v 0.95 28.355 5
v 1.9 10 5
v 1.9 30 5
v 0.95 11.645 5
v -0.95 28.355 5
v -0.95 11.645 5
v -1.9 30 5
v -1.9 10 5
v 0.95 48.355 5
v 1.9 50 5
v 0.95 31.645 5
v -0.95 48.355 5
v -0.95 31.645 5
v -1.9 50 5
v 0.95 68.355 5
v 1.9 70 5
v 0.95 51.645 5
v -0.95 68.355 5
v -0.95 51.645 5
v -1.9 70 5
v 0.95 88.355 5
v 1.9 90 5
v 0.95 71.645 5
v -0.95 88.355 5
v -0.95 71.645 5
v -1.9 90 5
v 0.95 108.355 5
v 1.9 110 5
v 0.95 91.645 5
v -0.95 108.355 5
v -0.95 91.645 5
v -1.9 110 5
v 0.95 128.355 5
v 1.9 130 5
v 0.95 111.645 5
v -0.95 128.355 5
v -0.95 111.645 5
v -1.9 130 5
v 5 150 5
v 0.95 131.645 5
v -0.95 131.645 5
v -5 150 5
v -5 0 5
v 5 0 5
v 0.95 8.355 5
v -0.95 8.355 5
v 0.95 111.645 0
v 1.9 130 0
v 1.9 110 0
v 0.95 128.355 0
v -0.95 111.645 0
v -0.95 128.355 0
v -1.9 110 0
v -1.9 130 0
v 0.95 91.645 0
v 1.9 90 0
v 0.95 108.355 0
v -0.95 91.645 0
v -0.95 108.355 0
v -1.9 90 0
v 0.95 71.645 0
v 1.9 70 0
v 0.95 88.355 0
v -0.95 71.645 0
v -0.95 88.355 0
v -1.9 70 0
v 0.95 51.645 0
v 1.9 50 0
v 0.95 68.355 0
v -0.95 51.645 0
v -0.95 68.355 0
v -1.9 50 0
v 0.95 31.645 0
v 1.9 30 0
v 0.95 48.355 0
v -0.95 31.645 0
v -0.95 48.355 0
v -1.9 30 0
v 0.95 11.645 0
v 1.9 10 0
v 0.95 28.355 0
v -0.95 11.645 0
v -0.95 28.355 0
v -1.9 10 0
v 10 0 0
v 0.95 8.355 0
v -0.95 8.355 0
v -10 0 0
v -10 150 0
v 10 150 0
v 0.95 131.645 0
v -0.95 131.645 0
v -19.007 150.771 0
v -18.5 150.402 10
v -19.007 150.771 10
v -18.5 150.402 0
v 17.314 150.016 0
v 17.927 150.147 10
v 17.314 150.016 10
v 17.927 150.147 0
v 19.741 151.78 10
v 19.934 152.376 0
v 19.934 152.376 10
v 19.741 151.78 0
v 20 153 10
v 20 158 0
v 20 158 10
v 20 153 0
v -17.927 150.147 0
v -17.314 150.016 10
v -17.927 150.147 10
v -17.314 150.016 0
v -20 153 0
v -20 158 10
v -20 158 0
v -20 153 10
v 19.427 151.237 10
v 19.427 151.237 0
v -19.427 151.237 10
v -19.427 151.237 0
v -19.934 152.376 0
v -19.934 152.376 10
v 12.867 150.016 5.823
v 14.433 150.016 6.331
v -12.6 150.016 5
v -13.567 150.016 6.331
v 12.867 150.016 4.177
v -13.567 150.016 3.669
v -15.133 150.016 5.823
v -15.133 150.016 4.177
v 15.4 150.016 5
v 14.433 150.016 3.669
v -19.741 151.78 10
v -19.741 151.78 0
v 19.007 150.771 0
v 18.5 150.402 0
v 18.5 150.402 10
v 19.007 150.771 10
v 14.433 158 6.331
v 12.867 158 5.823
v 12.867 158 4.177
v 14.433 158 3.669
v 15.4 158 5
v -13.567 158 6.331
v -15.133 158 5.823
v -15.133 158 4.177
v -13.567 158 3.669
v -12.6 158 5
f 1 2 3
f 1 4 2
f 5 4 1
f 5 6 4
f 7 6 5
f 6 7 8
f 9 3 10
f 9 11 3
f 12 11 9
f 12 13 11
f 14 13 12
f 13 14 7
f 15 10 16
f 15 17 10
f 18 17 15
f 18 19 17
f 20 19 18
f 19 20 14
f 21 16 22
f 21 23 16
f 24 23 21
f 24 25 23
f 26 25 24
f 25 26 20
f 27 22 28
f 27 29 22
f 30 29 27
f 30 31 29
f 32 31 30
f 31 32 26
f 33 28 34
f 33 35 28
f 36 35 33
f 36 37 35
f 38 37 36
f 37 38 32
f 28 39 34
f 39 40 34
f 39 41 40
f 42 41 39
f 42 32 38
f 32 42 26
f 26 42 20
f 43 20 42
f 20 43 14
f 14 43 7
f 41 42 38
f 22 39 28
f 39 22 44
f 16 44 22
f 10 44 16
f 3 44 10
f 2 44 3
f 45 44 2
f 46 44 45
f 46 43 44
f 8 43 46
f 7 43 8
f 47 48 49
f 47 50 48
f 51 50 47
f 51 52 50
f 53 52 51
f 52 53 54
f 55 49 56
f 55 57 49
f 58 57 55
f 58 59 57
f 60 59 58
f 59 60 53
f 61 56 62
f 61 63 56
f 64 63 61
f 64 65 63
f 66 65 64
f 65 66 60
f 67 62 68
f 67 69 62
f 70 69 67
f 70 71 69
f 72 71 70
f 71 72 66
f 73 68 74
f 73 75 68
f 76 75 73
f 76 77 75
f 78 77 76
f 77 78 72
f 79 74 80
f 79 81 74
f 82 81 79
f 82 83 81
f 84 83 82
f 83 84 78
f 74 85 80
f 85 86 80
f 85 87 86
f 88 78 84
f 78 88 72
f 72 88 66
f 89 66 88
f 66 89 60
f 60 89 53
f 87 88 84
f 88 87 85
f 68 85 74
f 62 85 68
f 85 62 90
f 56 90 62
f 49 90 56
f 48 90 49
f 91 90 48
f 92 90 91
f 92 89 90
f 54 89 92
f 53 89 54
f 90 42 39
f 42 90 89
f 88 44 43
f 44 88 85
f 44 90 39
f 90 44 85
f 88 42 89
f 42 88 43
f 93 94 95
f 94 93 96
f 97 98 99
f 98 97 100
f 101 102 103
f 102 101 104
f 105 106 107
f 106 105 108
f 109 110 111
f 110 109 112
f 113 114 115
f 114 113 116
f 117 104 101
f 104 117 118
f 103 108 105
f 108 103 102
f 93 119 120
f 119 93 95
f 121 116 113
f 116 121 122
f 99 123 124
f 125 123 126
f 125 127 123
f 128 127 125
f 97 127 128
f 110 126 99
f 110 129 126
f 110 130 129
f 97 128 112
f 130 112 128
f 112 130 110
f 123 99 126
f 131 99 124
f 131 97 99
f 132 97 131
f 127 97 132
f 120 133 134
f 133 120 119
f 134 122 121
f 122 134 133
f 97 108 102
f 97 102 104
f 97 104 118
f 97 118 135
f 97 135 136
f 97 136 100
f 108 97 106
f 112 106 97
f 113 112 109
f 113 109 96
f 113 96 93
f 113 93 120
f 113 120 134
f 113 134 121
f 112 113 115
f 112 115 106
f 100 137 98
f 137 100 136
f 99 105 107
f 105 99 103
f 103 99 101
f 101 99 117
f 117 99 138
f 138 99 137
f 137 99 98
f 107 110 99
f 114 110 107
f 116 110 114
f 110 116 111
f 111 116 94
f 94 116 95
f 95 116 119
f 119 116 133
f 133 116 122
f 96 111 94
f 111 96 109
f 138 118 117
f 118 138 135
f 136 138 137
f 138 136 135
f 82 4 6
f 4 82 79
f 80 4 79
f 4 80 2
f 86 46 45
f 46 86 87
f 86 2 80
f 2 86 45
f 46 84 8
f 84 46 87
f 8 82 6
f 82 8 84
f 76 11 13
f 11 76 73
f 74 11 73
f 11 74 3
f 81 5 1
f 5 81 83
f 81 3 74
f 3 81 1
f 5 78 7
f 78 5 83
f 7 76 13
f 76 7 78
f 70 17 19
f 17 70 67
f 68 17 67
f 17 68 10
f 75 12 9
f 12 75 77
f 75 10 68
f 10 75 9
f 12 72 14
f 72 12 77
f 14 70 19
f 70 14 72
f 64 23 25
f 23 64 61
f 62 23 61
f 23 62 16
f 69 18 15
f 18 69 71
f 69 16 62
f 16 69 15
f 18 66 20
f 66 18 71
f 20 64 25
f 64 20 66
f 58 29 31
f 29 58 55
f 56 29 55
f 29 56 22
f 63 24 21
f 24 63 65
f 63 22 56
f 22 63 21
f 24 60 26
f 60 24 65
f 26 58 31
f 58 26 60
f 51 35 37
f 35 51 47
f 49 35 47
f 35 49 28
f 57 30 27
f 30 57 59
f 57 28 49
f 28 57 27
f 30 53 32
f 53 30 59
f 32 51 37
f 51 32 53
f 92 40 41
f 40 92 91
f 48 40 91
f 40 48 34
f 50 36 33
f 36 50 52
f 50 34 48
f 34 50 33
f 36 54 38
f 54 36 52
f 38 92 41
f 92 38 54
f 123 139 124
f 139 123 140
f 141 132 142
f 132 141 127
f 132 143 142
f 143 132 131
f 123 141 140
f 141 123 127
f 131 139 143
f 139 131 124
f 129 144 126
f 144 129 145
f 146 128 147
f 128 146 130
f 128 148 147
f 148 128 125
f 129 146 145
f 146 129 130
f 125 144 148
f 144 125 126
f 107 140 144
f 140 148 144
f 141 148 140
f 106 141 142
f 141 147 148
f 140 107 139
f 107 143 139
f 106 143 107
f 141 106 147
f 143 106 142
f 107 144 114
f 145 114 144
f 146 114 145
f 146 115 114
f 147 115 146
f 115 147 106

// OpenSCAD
// file: common_parts.scad
include <tunable_constants.scad>;
//common_flat_screw_tap();
module M3_flat_screw(l = 10, l2 = 0) {
    // l2 is amount of the screw that are bigger for sliding through the hole
    tap_z = 1.9;
    rotate([180,0,0])
    union() {
        cylinder(d = C_M3_DIAMETER_THREAD, h= l);
        cylinder(d = C_M3_DIAMETER, h= l2);
        translate([0,0,-0.1+0.1]) cylinder(d1 = 6.5, d2= C_M3_DIAMETER_THREAD, h= tap_z);
        translate([0,0,-0.1]) cylinder(d = 6.5, h= 0.3);
    }
}

module M4_button_screw(l = 10, l2 = 0) {
    rotate([180,0,0])
    union() {
        cylinder(d = C_M4_DIAMETER_THREAD, h= l);
        cylinder(d = C_M4_DIAMETER, h= l2);
        translate([0,0,-4]) cylinder(d = 8, h=4);
    }
}
module M3_button_screw(l = 10, l2 = 0) {
    rotate([180,0,0])
    union() {
        cylinder(d = C_M3_DIAMETER_THREAD, h= l);
        cylinder(d = C_M3_DIAMETER, h= l2);
        translate([0,0,-4]) cylinder(d =6, h=4);
    }
}

module roundedcube(xdim ,ydim ,zdim,rdim){
    hull(){
        fn=30;
        translate([rdim,rdim,0]) cylinder(r=rdim, h=zdim, $fn=fn);
        translate([xdim-rdim,rdim,0])cylinder(r=rdim, h=zdim, $fn=fn);

        translate([rdim,ydim-rdim,0]) cylinder(r=rdim, h=zdim, $fn=fn);
        translate([xdim-rdim,ydim-rdim,0]) cylinder(r=rdim, h=zdim, $fn=fn);
    }
}
//beam45();
module beam45(w = 10, l = 10, h = 8) {
    difference() {
        union() {
            translate([-w/2,0,0]) cube([w,l,h]);
        }
        translate([w/2,0,0]) rotate([0,45,0])translate([-w-h,-1,0]) cube([w+h*2,l+2,h*2]);
        translate([-w/2,0,0]) rotate([0,-45,0])translate([0-w,-1,0]) cube([w+h*2,l+2,h*2]);
    }
}
//beam30();
module beam30(w = 10, l = 10, h = 8) {
    difference() {
        union() {
            translate([-w/2,0,0]) cube([w,l,h]);
        }
        translate([w/2,0,0]) rotate([0,90-30,0])translate([-w-h,-1,0]) cube([w+h*2,l+2,h*2]);
        translate([-w/2,0,0]) rotate([0,-90+30,0])translate([0-w,-1,0]) cube([w+h*2,l+2,h*2]);
    }
}


module cylinder_outer(height,radius,fn){
   fudge = 1/cos(180/fn);
   cylinder(h=height,r=radius*fudge,$fn=fn);
}

//indicator_dots(2);

module indicator_dots(valueIn) {
    for (a =[0:1:valueIn-1]) {
        translate([a*3,0,0]) cube([2,2,1]);
    }
}
// file: tunable_constants.scad
// Change parameters to fit your printer and slicer differences

C_M3_DIAMETER = 3.3; // size of a hole that a M3 screw will slide through
C_M3_DIAMETER_THREAD = 2.8; // size of a hole that a M3 screw will create own threads in

C_M3_NUT = 7;

C_KINGPIN_LOOSE = 3.5; // The hole for kingpin in the arms that are suposed to slide
C_KINGPIN_SNUG = 3.3; // The hole in the steering hub where the kingpin is suposed to be tightly locked with a screw

C_M4_NUT = 8.4;

C_M4_DIAMETER = 4.1; // size of a hole that a M4 screw will slide through
C_M4_DIAMETER_THREAD = 3.8; // size of a hole that a M4 screw will create own threads in

    b_12mm_tol = 0.3; // tolerance for bearing with 12mm diameter

C_12MM_BEARING_D = 12+b_12mm_tol; // Size of a hole that hold a 12mm bearing
C_12MM_BEARING_H = 3.5;

C_8MM_LOOSE = 8.7; // Loose fitting that will guarantie that it will not touch
C_8MM_TIGHT = 8.2; // Tight fitting for indrive etc
C_8MM_FIT = 8.5; // Perfect fit for it to be removable but not by much force, used for left wheel mount

C_SIGHT_MOUNT_S = 33.3375;

C_MOUNT1_W = 28;
// ############# Settings ################
S_CASTER = 4;
S_CAMBER = 2;

S_BAR_W = 20;
S_BAR_H = 5;
// main file
//
include <tunable_constants.scad>;
use <common_parts.scad>

w = C_SIGHT_MOUNT_S + 10;
h = 10;
l = 150;


// mounting to sight part
c_h = 10;
c_w = 40;
mount_beam_p();
module mount_beam_p() {
    
    
    difference() {
        union() {
            beam45(w=S_BAR_W, l=l, h=5);
            translate([-20,l,0]) roundedcube(c_w,20,c_h,3);
        }
        screws();
        translate([-20,l+8,0]) cube([c_w,20,c_h]);
    }

}

%screws();
module screws() {
    for (a =[0:20:120]) {
        
        translate([0,10+a,h]) M4_button_screw(l= 20, l2=0);
    }
    translate([C_MOUNT1_W/2,l,c_h/2]) rotate([90,0,0]) M3_button_screw(l2=0);
    translate([-C_MOUNT1_W/2,l,c_h/2]) rotate([90,0,0]) M3_button_screw(l2=0);
}
